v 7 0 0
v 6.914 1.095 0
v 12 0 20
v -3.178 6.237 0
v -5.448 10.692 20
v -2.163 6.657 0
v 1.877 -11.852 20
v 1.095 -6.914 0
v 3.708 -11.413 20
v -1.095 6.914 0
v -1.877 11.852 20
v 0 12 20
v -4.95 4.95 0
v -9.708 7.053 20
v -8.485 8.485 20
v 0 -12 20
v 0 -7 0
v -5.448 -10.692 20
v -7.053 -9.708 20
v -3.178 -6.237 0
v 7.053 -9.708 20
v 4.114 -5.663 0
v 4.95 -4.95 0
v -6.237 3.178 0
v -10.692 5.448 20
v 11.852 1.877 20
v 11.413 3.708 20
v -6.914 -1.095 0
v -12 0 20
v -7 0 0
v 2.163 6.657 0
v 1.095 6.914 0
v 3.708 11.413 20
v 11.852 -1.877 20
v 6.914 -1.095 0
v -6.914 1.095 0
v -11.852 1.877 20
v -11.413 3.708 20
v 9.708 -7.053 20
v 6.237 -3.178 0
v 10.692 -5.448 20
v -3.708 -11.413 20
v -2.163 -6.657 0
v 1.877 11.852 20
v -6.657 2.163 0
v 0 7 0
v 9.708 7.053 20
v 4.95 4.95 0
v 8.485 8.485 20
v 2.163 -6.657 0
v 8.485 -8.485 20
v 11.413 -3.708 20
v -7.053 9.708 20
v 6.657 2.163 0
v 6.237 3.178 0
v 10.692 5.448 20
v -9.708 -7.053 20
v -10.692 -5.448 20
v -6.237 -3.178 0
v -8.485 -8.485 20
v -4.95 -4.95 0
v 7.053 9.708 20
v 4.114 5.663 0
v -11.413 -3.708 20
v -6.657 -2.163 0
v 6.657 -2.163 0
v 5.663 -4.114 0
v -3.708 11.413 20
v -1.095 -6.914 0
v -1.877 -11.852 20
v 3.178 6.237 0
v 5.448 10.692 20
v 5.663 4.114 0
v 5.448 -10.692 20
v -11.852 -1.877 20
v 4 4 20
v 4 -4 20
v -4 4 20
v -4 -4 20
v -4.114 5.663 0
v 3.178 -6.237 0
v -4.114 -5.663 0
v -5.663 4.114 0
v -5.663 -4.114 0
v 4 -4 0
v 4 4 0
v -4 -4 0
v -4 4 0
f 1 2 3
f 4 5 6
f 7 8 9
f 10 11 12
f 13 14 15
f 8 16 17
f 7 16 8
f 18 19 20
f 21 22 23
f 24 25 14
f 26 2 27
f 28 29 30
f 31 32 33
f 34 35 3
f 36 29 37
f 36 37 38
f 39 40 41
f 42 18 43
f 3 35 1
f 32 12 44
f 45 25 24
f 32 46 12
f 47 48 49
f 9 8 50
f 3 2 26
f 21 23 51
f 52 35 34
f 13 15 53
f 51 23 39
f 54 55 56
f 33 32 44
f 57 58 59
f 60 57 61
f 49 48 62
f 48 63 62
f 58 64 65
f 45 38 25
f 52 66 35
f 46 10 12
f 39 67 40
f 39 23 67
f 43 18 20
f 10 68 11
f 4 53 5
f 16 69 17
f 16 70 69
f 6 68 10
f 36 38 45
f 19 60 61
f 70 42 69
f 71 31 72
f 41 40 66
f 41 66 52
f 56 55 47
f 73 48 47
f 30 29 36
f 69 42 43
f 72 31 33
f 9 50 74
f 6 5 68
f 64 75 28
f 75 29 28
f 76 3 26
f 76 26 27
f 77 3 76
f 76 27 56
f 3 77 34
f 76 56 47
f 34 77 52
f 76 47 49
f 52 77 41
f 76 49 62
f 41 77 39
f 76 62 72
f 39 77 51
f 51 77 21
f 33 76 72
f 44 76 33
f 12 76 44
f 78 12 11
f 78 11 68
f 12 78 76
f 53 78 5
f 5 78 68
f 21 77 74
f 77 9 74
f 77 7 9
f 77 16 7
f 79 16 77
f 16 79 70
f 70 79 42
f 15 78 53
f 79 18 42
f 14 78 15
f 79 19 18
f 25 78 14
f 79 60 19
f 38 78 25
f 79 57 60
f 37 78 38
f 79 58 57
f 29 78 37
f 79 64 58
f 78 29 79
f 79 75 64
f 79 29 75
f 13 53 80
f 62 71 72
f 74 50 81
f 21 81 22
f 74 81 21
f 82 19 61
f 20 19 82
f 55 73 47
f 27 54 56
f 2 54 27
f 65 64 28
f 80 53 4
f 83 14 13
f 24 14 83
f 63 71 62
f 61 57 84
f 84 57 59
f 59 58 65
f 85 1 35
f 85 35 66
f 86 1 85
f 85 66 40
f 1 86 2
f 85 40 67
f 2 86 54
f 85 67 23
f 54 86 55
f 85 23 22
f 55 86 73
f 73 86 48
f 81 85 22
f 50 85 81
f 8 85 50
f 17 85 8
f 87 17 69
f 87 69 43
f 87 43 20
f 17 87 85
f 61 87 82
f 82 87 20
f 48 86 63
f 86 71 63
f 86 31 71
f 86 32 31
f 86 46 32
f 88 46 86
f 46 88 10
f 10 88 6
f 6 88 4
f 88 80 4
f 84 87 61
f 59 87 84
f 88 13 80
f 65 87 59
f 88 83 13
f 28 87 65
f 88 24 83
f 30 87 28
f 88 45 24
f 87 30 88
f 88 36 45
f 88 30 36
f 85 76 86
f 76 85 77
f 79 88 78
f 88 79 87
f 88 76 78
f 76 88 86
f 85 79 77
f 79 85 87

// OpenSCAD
difference(){
	cylinder(r1=7,r2=12, $fn=40,h=20);
	cube(center=true,size=[8,8,100]);
}
